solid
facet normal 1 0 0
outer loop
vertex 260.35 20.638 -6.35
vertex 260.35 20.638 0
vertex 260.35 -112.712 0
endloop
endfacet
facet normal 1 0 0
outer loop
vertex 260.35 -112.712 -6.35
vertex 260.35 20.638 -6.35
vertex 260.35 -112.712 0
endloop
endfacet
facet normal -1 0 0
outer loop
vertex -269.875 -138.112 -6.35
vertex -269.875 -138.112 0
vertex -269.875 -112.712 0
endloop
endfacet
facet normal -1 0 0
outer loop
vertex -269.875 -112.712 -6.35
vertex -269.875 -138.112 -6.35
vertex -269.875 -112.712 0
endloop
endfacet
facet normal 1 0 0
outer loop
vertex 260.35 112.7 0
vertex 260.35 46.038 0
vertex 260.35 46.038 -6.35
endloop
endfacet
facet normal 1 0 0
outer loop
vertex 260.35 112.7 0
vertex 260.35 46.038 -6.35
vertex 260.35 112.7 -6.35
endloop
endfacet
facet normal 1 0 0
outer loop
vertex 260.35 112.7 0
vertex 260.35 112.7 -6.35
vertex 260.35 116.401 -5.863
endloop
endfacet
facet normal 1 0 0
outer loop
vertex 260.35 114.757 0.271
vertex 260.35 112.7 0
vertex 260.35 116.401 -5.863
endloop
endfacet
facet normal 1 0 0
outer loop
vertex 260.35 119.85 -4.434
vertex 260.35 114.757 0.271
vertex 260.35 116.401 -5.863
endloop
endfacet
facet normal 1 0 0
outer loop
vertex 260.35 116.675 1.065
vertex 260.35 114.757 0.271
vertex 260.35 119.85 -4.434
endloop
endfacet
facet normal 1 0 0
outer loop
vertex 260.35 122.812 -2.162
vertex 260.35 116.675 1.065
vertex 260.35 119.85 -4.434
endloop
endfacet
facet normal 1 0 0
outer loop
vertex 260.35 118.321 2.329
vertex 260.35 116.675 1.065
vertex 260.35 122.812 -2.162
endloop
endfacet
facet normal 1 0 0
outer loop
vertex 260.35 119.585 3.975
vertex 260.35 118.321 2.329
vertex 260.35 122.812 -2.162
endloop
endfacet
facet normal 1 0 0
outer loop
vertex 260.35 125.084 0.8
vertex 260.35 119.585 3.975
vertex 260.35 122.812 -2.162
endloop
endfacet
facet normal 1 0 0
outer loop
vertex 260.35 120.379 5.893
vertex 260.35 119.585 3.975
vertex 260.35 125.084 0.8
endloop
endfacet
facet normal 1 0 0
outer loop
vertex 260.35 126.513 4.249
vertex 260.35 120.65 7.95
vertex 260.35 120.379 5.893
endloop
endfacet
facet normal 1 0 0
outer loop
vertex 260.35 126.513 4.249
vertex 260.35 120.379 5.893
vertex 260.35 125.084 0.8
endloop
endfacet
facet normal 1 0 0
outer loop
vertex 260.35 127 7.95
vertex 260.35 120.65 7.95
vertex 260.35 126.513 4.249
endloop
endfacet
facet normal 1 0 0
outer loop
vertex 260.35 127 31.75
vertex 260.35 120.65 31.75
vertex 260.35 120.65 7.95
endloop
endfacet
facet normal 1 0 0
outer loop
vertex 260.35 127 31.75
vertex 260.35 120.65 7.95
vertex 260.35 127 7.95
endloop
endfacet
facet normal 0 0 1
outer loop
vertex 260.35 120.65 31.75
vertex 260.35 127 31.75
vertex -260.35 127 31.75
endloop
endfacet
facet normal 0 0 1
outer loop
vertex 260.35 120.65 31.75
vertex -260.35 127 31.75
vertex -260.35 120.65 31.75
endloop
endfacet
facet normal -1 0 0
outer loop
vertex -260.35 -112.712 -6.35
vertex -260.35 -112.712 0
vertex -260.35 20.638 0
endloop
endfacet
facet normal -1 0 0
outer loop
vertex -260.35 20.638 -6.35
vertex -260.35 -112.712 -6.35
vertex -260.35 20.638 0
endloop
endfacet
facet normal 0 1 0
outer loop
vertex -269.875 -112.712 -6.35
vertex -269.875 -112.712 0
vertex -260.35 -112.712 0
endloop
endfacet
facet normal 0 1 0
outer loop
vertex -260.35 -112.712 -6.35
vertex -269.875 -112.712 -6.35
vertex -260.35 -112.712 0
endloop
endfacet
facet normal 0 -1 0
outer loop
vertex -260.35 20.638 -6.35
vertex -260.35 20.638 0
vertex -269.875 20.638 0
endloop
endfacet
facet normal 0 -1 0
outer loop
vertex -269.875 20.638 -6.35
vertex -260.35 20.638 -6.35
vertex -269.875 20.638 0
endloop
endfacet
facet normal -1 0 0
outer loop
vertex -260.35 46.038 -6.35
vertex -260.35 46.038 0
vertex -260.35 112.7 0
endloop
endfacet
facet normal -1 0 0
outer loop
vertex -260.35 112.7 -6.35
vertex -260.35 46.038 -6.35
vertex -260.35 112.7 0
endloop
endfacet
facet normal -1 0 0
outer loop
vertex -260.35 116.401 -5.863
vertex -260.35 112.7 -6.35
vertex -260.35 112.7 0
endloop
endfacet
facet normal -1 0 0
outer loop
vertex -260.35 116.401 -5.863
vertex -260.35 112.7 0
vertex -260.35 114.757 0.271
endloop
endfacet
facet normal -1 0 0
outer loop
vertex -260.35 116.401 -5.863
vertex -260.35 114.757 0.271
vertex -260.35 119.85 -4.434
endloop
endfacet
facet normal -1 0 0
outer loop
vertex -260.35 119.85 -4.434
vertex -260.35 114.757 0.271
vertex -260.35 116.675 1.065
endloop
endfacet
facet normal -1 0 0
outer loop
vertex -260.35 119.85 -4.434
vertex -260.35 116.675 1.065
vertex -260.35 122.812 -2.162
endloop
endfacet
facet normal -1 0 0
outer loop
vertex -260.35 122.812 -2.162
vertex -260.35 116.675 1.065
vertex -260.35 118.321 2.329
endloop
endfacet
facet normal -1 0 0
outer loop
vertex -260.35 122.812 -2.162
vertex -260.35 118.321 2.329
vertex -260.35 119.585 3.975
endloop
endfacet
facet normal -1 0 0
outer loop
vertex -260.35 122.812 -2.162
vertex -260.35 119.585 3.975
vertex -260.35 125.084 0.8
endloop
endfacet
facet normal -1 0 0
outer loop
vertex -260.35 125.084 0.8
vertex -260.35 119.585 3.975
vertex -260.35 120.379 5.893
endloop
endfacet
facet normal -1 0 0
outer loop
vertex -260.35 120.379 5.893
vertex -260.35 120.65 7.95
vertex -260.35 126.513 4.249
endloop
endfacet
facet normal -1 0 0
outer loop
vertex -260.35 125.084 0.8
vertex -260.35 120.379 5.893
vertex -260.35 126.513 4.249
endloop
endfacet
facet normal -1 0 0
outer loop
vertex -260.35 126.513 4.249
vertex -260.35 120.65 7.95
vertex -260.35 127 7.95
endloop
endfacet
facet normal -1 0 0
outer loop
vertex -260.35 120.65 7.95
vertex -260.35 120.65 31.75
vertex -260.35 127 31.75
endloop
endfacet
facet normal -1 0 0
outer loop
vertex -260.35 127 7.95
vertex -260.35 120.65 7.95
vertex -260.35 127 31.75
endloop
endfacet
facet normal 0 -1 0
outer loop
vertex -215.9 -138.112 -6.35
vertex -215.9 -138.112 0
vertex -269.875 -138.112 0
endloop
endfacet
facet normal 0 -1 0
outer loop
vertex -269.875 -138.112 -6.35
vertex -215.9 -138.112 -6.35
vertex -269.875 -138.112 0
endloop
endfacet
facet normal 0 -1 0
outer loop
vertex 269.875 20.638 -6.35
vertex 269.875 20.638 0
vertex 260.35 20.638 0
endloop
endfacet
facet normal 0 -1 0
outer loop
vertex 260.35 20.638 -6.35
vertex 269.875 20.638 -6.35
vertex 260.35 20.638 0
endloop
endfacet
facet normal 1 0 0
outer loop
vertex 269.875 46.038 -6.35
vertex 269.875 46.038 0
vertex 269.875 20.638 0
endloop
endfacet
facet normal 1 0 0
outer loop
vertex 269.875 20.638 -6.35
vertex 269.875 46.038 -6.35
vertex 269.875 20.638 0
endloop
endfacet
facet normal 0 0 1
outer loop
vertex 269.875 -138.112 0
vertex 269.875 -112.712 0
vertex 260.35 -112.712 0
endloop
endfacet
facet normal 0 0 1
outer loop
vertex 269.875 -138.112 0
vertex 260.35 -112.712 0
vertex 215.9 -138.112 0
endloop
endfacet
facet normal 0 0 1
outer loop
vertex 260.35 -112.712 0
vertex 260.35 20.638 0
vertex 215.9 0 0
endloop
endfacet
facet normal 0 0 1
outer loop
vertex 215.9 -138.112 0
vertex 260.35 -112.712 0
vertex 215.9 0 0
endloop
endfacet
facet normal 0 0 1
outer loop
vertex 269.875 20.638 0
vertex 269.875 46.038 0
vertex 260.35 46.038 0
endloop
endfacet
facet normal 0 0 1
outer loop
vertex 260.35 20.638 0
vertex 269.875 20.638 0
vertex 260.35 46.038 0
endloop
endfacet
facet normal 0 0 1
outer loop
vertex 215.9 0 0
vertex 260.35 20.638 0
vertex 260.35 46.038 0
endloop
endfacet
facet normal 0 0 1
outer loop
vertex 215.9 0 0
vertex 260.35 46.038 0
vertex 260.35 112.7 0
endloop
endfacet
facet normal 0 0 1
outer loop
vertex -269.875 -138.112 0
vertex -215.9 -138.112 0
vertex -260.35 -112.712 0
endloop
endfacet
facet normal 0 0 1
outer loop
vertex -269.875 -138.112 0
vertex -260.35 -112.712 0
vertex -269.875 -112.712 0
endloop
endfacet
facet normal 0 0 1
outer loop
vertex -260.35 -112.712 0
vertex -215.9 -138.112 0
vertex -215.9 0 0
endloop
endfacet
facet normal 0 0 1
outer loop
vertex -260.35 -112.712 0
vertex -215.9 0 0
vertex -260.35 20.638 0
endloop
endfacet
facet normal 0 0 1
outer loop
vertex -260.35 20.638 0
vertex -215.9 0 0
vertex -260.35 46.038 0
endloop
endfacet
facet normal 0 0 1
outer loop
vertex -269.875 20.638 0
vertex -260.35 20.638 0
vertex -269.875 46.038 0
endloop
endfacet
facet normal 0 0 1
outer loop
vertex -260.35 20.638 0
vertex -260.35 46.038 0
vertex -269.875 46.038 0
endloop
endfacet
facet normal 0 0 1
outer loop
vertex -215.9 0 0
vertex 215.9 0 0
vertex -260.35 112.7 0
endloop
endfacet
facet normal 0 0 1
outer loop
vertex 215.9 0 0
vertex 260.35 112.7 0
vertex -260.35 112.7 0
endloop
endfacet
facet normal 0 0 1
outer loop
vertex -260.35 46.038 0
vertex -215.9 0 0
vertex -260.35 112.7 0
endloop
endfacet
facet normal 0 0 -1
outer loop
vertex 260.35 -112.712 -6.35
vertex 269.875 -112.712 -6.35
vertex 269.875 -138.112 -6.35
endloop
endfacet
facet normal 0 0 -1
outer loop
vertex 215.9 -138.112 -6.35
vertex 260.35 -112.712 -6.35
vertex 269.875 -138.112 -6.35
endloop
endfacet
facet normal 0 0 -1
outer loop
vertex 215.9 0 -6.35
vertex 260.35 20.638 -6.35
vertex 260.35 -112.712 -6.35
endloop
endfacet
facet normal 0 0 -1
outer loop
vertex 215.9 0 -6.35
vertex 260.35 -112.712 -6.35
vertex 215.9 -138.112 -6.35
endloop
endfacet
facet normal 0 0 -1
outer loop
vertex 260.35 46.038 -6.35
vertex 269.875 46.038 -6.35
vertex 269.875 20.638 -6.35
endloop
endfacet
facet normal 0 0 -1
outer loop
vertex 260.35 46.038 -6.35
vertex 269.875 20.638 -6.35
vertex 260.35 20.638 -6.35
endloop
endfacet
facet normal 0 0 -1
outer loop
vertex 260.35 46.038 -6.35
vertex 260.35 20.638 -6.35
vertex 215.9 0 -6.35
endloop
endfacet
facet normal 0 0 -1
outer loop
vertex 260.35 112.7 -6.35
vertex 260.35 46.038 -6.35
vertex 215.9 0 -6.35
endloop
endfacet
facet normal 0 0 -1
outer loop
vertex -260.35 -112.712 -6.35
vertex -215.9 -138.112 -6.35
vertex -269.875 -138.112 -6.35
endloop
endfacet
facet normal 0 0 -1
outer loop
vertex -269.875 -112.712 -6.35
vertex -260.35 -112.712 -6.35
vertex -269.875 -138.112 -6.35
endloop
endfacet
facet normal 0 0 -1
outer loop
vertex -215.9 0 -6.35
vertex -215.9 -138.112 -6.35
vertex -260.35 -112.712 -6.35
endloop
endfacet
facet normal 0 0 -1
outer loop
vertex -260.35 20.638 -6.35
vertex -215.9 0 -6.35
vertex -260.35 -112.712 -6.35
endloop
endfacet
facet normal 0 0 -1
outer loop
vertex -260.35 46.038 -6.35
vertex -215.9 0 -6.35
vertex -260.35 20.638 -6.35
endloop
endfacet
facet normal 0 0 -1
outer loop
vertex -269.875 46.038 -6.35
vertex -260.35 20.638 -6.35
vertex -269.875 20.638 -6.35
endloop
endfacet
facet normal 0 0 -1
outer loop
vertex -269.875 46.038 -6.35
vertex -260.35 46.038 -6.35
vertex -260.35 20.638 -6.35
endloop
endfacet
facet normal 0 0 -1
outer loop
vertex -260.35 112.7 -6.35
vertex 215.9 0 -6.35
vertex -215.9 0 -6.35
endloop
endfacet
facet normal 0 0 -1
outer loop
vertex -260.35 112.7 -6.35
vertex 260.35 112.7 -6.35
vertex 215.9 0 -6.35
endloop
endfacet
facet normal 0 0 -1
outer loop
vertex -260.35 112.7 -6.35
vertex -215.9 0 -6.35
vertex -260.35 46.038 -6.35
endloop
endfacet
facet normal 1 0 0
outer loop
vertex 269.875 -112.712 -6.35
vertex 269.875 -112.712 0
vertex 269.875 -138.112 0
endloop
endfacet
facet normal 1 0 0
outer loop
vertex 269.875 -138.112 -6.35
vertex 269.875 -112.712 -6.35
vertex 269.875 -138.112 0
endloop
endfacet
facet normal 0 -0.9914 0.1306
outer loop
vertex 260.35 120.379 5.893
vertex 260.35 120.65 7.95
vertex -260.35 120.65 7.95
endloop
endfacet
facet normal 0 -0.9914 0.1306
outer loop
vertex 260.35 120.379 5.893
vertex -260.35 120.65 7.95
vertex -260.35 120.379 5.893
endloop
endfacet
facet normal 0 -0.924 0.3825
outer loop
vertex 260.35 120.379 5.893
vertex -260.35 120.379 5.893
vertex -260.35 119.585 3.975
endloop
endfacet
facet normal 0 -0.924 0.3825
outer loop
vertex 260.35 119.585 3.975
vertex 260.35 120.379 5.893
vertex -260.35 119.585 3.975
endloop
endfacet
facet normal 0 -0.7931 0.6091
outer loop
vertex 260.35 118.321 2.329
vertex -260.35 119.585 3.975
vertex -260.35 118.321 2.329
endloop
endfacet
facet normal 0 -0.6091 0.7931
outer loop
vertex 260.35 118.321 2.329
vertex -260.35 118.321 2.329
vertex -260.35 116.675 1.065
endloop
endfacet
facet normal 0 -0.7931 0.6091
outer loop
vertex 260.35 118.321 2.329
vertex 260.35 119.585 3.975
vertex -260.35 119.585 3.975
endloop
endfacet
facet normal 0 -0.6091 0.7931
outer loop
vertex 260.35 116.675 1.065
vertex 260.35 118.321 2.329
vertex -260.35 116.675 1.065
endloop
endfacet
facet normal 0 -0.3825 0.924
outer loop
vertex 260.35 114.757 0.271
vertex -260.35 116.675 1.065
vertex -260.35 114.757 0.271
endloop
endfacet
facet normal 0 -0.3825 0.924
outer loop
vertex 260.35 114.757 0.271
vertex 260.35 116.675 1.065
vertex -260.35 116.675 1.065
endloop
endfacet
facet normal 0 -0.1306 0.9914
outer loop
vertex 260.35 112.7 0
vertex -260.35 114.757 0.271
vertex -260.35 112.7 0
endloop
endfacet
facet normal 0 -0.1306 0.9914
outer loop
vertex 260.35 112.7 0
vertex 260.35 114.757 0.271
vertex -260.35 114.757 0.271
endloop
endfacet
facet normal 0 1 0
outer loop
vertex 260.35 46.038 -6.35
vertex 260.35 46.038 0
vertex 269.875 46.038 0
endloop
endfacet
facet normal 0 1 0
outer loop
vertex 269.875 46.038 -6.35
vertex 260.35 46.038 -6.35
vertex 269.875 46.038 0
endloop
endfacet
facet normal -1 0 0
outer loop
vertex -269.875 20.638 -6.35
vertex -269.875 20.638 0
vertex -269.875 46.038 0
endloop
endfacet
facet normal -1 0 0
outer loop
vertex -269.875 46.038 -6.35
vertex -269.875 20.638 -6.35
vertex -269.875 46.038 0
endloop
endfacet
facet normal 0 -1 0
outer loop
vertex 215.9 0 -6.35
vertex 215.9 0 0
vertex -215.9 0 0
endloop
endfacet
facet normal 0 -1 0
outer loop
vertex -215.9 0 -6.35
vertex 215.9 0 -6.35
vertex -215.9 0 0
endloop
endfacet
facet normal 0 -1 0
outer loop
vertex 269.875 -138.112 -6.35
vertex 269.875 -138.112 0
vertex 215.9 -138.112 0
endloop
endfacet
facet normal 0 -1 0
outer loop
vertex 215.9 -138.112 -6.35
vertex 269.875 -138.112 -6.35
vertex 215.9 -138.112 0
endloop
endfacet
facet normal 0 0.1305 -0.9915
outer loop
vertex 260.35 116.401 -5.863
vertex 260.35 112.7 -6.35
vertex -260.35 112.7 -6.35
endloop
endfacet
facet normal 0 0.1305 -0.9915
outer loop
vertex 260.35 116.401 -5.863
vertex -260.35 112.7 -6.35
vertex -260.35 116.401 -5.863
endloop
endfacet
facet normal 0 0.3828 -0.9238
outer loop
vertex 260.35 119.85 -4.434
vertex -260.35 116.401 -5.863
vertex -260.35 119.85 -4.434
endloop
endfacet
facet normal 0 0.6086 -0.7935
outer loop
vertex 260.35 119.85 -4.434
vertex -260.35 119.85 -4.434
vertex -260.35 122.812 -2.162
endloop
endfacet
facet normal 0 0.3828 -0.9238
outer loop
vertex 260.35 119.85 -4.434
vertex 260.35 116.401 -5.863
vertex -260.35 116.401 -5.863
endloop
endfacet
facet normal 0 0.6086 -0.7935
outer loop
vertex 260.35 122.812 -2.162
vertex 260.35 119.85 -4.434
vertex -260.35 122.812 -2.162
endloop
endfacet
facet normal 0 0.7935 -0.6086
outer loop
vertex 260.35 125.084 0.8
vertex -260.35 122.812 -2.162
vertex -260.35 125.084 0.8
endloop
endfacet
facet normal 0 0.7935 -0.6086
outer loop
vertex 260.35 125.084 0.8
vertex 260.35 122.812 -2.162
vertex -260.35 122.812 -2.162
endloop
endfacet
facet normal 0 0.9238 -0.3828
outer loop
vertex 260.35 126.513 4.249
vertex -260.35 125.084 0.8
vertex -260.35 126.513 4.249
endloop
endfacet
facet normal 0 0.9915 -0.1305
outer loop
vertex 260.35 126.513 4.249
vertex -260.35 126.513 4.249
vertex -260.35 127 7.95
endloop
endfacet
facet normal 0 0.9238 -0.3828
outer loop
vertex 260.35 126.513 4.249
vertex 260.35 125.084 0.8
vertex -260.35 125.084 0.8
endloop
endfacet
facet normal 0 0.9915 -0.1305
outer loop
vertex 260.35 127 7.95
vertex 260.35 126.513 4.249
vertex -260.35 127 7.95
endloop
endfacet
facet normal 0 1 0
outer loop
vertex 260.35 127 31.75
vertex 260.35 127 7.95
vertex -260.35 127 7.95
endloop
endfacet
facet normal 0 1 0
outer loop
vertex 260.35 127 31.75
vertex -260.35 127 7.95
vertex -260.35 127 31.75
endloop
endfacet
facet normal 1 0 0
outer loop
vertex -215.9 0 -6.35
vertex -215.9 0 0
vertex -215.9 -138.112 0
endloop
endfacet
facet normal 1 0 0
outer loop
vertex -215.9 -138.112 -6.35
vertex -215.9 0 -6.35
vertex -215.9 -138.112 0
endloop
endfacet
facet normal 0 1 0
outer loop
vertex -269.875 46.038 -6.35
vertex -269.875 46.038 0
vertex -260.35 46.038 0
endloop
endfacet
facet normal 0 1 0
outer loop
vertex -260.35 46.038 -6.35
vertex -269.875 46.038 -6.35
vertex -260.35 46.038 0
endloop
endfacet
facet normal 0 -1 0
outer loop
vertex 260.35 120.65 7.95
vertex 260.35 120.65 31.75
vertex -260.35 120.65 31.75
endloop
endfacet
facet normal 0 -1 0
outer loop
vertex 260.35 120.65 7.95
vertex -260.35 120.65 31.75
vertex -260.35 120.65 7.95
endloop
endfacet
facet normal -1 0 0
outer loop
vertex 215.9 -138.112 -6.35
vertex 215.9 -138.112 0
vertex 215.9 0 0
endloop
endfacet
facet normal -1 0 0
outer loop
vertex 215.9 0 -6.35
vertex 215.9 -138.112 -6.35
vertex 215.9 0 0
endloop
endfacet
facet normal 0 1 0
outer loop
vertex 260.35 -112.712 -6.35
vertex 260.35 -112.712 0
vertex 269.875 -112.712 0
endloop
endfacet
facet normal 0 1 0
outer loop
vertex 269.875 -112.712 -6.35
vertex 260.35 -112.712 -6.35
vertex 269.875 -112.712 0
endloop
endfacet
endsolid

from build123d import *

# Parameters (mm, degrees)
BASE_FLANGE1_DEPTH           = 6.35
EDGE_FLANGE1_STRIP_W         = 41.3004
EDGE_FLANGE1_STRIP_H         = 6.35
EDGE_FLANGE1_STRIP_CUT_DEPTH = 520.7
EDGE_FLANGE1_DEPTH           = 520.7


# Sheet-metal steps are written as plain solids
with BuildPart() as part:
    # Sketch1 → Base-Flange1 (new body)
    with BuildSketch(Plane.XY):
        Polygon((-260.35, 127), (260.35, 127), (260.35, 46.0375), (269.875, 46.0375), (269.875, 20.6375), (260.35, 20.6375), (260.35, -112.7125), (269.875, -112.7125), (269.875, -138.1125), (215.9, -138.1125), (215.9, 0), (-215.9, 0), (-215.9, -138.1125), (-269.875, -138.1125), (-269.875, -112.7125), (-260.35, -112.7125), (-260.35, 20.6375), (-269.875, 20.6375), (-269.875, 46.0375), (-260.35, 46.0375), align=None)
    extrude(amount=-BASE_FLANGE1_DEPTH)

    # Edge-Flange1 strip (across the edge) → Edge-Flange1 strip cut (cut)
    with BuildSketch(Plane(origin=(260.35, 127, 0), x_dir=(0, -1, 0), z_dir=(-1, 0, 0))):
        with Locations((-6.35, -3.175)):
            Rectangle(EDGE_FLANGE1_STRIP_W, EDGE_FLANGE1_STRIP_H)
    extrude(amount=EDGE_FLANGE1_STRIP_CUT_DEPTH, mode=Mode.SUBTRACT)

    # Edge-Flange1 section (across the edge) → Edge-Flange1 (add)
    with BuildSketch(Plane(origin=(260.35, 127, 0), x_dir=(0, -1, 0), z_dir=(-1, 0, 0))):
        with BuildLine():
            Line((0, 7.9502), (0, 31.75))
            Line((0, 31.75), (6.35, 31.75))
            Line((6.35, 31.75), (6.35, 7.9502))
            ThreePointArc((6.35, 7.9502), (8.678559668, 2.328559668), (14.3002, 0))
            Line((14.3002, 0), (14.3002, -6.35))
            ThreePointArc((14.3002, -6.35), (4.188431608, -2.161568392), (0, 7.9502))
        make_face()
    extrude(amount=EDGE_FLANGE1_DEPTH)


solid = part.part
